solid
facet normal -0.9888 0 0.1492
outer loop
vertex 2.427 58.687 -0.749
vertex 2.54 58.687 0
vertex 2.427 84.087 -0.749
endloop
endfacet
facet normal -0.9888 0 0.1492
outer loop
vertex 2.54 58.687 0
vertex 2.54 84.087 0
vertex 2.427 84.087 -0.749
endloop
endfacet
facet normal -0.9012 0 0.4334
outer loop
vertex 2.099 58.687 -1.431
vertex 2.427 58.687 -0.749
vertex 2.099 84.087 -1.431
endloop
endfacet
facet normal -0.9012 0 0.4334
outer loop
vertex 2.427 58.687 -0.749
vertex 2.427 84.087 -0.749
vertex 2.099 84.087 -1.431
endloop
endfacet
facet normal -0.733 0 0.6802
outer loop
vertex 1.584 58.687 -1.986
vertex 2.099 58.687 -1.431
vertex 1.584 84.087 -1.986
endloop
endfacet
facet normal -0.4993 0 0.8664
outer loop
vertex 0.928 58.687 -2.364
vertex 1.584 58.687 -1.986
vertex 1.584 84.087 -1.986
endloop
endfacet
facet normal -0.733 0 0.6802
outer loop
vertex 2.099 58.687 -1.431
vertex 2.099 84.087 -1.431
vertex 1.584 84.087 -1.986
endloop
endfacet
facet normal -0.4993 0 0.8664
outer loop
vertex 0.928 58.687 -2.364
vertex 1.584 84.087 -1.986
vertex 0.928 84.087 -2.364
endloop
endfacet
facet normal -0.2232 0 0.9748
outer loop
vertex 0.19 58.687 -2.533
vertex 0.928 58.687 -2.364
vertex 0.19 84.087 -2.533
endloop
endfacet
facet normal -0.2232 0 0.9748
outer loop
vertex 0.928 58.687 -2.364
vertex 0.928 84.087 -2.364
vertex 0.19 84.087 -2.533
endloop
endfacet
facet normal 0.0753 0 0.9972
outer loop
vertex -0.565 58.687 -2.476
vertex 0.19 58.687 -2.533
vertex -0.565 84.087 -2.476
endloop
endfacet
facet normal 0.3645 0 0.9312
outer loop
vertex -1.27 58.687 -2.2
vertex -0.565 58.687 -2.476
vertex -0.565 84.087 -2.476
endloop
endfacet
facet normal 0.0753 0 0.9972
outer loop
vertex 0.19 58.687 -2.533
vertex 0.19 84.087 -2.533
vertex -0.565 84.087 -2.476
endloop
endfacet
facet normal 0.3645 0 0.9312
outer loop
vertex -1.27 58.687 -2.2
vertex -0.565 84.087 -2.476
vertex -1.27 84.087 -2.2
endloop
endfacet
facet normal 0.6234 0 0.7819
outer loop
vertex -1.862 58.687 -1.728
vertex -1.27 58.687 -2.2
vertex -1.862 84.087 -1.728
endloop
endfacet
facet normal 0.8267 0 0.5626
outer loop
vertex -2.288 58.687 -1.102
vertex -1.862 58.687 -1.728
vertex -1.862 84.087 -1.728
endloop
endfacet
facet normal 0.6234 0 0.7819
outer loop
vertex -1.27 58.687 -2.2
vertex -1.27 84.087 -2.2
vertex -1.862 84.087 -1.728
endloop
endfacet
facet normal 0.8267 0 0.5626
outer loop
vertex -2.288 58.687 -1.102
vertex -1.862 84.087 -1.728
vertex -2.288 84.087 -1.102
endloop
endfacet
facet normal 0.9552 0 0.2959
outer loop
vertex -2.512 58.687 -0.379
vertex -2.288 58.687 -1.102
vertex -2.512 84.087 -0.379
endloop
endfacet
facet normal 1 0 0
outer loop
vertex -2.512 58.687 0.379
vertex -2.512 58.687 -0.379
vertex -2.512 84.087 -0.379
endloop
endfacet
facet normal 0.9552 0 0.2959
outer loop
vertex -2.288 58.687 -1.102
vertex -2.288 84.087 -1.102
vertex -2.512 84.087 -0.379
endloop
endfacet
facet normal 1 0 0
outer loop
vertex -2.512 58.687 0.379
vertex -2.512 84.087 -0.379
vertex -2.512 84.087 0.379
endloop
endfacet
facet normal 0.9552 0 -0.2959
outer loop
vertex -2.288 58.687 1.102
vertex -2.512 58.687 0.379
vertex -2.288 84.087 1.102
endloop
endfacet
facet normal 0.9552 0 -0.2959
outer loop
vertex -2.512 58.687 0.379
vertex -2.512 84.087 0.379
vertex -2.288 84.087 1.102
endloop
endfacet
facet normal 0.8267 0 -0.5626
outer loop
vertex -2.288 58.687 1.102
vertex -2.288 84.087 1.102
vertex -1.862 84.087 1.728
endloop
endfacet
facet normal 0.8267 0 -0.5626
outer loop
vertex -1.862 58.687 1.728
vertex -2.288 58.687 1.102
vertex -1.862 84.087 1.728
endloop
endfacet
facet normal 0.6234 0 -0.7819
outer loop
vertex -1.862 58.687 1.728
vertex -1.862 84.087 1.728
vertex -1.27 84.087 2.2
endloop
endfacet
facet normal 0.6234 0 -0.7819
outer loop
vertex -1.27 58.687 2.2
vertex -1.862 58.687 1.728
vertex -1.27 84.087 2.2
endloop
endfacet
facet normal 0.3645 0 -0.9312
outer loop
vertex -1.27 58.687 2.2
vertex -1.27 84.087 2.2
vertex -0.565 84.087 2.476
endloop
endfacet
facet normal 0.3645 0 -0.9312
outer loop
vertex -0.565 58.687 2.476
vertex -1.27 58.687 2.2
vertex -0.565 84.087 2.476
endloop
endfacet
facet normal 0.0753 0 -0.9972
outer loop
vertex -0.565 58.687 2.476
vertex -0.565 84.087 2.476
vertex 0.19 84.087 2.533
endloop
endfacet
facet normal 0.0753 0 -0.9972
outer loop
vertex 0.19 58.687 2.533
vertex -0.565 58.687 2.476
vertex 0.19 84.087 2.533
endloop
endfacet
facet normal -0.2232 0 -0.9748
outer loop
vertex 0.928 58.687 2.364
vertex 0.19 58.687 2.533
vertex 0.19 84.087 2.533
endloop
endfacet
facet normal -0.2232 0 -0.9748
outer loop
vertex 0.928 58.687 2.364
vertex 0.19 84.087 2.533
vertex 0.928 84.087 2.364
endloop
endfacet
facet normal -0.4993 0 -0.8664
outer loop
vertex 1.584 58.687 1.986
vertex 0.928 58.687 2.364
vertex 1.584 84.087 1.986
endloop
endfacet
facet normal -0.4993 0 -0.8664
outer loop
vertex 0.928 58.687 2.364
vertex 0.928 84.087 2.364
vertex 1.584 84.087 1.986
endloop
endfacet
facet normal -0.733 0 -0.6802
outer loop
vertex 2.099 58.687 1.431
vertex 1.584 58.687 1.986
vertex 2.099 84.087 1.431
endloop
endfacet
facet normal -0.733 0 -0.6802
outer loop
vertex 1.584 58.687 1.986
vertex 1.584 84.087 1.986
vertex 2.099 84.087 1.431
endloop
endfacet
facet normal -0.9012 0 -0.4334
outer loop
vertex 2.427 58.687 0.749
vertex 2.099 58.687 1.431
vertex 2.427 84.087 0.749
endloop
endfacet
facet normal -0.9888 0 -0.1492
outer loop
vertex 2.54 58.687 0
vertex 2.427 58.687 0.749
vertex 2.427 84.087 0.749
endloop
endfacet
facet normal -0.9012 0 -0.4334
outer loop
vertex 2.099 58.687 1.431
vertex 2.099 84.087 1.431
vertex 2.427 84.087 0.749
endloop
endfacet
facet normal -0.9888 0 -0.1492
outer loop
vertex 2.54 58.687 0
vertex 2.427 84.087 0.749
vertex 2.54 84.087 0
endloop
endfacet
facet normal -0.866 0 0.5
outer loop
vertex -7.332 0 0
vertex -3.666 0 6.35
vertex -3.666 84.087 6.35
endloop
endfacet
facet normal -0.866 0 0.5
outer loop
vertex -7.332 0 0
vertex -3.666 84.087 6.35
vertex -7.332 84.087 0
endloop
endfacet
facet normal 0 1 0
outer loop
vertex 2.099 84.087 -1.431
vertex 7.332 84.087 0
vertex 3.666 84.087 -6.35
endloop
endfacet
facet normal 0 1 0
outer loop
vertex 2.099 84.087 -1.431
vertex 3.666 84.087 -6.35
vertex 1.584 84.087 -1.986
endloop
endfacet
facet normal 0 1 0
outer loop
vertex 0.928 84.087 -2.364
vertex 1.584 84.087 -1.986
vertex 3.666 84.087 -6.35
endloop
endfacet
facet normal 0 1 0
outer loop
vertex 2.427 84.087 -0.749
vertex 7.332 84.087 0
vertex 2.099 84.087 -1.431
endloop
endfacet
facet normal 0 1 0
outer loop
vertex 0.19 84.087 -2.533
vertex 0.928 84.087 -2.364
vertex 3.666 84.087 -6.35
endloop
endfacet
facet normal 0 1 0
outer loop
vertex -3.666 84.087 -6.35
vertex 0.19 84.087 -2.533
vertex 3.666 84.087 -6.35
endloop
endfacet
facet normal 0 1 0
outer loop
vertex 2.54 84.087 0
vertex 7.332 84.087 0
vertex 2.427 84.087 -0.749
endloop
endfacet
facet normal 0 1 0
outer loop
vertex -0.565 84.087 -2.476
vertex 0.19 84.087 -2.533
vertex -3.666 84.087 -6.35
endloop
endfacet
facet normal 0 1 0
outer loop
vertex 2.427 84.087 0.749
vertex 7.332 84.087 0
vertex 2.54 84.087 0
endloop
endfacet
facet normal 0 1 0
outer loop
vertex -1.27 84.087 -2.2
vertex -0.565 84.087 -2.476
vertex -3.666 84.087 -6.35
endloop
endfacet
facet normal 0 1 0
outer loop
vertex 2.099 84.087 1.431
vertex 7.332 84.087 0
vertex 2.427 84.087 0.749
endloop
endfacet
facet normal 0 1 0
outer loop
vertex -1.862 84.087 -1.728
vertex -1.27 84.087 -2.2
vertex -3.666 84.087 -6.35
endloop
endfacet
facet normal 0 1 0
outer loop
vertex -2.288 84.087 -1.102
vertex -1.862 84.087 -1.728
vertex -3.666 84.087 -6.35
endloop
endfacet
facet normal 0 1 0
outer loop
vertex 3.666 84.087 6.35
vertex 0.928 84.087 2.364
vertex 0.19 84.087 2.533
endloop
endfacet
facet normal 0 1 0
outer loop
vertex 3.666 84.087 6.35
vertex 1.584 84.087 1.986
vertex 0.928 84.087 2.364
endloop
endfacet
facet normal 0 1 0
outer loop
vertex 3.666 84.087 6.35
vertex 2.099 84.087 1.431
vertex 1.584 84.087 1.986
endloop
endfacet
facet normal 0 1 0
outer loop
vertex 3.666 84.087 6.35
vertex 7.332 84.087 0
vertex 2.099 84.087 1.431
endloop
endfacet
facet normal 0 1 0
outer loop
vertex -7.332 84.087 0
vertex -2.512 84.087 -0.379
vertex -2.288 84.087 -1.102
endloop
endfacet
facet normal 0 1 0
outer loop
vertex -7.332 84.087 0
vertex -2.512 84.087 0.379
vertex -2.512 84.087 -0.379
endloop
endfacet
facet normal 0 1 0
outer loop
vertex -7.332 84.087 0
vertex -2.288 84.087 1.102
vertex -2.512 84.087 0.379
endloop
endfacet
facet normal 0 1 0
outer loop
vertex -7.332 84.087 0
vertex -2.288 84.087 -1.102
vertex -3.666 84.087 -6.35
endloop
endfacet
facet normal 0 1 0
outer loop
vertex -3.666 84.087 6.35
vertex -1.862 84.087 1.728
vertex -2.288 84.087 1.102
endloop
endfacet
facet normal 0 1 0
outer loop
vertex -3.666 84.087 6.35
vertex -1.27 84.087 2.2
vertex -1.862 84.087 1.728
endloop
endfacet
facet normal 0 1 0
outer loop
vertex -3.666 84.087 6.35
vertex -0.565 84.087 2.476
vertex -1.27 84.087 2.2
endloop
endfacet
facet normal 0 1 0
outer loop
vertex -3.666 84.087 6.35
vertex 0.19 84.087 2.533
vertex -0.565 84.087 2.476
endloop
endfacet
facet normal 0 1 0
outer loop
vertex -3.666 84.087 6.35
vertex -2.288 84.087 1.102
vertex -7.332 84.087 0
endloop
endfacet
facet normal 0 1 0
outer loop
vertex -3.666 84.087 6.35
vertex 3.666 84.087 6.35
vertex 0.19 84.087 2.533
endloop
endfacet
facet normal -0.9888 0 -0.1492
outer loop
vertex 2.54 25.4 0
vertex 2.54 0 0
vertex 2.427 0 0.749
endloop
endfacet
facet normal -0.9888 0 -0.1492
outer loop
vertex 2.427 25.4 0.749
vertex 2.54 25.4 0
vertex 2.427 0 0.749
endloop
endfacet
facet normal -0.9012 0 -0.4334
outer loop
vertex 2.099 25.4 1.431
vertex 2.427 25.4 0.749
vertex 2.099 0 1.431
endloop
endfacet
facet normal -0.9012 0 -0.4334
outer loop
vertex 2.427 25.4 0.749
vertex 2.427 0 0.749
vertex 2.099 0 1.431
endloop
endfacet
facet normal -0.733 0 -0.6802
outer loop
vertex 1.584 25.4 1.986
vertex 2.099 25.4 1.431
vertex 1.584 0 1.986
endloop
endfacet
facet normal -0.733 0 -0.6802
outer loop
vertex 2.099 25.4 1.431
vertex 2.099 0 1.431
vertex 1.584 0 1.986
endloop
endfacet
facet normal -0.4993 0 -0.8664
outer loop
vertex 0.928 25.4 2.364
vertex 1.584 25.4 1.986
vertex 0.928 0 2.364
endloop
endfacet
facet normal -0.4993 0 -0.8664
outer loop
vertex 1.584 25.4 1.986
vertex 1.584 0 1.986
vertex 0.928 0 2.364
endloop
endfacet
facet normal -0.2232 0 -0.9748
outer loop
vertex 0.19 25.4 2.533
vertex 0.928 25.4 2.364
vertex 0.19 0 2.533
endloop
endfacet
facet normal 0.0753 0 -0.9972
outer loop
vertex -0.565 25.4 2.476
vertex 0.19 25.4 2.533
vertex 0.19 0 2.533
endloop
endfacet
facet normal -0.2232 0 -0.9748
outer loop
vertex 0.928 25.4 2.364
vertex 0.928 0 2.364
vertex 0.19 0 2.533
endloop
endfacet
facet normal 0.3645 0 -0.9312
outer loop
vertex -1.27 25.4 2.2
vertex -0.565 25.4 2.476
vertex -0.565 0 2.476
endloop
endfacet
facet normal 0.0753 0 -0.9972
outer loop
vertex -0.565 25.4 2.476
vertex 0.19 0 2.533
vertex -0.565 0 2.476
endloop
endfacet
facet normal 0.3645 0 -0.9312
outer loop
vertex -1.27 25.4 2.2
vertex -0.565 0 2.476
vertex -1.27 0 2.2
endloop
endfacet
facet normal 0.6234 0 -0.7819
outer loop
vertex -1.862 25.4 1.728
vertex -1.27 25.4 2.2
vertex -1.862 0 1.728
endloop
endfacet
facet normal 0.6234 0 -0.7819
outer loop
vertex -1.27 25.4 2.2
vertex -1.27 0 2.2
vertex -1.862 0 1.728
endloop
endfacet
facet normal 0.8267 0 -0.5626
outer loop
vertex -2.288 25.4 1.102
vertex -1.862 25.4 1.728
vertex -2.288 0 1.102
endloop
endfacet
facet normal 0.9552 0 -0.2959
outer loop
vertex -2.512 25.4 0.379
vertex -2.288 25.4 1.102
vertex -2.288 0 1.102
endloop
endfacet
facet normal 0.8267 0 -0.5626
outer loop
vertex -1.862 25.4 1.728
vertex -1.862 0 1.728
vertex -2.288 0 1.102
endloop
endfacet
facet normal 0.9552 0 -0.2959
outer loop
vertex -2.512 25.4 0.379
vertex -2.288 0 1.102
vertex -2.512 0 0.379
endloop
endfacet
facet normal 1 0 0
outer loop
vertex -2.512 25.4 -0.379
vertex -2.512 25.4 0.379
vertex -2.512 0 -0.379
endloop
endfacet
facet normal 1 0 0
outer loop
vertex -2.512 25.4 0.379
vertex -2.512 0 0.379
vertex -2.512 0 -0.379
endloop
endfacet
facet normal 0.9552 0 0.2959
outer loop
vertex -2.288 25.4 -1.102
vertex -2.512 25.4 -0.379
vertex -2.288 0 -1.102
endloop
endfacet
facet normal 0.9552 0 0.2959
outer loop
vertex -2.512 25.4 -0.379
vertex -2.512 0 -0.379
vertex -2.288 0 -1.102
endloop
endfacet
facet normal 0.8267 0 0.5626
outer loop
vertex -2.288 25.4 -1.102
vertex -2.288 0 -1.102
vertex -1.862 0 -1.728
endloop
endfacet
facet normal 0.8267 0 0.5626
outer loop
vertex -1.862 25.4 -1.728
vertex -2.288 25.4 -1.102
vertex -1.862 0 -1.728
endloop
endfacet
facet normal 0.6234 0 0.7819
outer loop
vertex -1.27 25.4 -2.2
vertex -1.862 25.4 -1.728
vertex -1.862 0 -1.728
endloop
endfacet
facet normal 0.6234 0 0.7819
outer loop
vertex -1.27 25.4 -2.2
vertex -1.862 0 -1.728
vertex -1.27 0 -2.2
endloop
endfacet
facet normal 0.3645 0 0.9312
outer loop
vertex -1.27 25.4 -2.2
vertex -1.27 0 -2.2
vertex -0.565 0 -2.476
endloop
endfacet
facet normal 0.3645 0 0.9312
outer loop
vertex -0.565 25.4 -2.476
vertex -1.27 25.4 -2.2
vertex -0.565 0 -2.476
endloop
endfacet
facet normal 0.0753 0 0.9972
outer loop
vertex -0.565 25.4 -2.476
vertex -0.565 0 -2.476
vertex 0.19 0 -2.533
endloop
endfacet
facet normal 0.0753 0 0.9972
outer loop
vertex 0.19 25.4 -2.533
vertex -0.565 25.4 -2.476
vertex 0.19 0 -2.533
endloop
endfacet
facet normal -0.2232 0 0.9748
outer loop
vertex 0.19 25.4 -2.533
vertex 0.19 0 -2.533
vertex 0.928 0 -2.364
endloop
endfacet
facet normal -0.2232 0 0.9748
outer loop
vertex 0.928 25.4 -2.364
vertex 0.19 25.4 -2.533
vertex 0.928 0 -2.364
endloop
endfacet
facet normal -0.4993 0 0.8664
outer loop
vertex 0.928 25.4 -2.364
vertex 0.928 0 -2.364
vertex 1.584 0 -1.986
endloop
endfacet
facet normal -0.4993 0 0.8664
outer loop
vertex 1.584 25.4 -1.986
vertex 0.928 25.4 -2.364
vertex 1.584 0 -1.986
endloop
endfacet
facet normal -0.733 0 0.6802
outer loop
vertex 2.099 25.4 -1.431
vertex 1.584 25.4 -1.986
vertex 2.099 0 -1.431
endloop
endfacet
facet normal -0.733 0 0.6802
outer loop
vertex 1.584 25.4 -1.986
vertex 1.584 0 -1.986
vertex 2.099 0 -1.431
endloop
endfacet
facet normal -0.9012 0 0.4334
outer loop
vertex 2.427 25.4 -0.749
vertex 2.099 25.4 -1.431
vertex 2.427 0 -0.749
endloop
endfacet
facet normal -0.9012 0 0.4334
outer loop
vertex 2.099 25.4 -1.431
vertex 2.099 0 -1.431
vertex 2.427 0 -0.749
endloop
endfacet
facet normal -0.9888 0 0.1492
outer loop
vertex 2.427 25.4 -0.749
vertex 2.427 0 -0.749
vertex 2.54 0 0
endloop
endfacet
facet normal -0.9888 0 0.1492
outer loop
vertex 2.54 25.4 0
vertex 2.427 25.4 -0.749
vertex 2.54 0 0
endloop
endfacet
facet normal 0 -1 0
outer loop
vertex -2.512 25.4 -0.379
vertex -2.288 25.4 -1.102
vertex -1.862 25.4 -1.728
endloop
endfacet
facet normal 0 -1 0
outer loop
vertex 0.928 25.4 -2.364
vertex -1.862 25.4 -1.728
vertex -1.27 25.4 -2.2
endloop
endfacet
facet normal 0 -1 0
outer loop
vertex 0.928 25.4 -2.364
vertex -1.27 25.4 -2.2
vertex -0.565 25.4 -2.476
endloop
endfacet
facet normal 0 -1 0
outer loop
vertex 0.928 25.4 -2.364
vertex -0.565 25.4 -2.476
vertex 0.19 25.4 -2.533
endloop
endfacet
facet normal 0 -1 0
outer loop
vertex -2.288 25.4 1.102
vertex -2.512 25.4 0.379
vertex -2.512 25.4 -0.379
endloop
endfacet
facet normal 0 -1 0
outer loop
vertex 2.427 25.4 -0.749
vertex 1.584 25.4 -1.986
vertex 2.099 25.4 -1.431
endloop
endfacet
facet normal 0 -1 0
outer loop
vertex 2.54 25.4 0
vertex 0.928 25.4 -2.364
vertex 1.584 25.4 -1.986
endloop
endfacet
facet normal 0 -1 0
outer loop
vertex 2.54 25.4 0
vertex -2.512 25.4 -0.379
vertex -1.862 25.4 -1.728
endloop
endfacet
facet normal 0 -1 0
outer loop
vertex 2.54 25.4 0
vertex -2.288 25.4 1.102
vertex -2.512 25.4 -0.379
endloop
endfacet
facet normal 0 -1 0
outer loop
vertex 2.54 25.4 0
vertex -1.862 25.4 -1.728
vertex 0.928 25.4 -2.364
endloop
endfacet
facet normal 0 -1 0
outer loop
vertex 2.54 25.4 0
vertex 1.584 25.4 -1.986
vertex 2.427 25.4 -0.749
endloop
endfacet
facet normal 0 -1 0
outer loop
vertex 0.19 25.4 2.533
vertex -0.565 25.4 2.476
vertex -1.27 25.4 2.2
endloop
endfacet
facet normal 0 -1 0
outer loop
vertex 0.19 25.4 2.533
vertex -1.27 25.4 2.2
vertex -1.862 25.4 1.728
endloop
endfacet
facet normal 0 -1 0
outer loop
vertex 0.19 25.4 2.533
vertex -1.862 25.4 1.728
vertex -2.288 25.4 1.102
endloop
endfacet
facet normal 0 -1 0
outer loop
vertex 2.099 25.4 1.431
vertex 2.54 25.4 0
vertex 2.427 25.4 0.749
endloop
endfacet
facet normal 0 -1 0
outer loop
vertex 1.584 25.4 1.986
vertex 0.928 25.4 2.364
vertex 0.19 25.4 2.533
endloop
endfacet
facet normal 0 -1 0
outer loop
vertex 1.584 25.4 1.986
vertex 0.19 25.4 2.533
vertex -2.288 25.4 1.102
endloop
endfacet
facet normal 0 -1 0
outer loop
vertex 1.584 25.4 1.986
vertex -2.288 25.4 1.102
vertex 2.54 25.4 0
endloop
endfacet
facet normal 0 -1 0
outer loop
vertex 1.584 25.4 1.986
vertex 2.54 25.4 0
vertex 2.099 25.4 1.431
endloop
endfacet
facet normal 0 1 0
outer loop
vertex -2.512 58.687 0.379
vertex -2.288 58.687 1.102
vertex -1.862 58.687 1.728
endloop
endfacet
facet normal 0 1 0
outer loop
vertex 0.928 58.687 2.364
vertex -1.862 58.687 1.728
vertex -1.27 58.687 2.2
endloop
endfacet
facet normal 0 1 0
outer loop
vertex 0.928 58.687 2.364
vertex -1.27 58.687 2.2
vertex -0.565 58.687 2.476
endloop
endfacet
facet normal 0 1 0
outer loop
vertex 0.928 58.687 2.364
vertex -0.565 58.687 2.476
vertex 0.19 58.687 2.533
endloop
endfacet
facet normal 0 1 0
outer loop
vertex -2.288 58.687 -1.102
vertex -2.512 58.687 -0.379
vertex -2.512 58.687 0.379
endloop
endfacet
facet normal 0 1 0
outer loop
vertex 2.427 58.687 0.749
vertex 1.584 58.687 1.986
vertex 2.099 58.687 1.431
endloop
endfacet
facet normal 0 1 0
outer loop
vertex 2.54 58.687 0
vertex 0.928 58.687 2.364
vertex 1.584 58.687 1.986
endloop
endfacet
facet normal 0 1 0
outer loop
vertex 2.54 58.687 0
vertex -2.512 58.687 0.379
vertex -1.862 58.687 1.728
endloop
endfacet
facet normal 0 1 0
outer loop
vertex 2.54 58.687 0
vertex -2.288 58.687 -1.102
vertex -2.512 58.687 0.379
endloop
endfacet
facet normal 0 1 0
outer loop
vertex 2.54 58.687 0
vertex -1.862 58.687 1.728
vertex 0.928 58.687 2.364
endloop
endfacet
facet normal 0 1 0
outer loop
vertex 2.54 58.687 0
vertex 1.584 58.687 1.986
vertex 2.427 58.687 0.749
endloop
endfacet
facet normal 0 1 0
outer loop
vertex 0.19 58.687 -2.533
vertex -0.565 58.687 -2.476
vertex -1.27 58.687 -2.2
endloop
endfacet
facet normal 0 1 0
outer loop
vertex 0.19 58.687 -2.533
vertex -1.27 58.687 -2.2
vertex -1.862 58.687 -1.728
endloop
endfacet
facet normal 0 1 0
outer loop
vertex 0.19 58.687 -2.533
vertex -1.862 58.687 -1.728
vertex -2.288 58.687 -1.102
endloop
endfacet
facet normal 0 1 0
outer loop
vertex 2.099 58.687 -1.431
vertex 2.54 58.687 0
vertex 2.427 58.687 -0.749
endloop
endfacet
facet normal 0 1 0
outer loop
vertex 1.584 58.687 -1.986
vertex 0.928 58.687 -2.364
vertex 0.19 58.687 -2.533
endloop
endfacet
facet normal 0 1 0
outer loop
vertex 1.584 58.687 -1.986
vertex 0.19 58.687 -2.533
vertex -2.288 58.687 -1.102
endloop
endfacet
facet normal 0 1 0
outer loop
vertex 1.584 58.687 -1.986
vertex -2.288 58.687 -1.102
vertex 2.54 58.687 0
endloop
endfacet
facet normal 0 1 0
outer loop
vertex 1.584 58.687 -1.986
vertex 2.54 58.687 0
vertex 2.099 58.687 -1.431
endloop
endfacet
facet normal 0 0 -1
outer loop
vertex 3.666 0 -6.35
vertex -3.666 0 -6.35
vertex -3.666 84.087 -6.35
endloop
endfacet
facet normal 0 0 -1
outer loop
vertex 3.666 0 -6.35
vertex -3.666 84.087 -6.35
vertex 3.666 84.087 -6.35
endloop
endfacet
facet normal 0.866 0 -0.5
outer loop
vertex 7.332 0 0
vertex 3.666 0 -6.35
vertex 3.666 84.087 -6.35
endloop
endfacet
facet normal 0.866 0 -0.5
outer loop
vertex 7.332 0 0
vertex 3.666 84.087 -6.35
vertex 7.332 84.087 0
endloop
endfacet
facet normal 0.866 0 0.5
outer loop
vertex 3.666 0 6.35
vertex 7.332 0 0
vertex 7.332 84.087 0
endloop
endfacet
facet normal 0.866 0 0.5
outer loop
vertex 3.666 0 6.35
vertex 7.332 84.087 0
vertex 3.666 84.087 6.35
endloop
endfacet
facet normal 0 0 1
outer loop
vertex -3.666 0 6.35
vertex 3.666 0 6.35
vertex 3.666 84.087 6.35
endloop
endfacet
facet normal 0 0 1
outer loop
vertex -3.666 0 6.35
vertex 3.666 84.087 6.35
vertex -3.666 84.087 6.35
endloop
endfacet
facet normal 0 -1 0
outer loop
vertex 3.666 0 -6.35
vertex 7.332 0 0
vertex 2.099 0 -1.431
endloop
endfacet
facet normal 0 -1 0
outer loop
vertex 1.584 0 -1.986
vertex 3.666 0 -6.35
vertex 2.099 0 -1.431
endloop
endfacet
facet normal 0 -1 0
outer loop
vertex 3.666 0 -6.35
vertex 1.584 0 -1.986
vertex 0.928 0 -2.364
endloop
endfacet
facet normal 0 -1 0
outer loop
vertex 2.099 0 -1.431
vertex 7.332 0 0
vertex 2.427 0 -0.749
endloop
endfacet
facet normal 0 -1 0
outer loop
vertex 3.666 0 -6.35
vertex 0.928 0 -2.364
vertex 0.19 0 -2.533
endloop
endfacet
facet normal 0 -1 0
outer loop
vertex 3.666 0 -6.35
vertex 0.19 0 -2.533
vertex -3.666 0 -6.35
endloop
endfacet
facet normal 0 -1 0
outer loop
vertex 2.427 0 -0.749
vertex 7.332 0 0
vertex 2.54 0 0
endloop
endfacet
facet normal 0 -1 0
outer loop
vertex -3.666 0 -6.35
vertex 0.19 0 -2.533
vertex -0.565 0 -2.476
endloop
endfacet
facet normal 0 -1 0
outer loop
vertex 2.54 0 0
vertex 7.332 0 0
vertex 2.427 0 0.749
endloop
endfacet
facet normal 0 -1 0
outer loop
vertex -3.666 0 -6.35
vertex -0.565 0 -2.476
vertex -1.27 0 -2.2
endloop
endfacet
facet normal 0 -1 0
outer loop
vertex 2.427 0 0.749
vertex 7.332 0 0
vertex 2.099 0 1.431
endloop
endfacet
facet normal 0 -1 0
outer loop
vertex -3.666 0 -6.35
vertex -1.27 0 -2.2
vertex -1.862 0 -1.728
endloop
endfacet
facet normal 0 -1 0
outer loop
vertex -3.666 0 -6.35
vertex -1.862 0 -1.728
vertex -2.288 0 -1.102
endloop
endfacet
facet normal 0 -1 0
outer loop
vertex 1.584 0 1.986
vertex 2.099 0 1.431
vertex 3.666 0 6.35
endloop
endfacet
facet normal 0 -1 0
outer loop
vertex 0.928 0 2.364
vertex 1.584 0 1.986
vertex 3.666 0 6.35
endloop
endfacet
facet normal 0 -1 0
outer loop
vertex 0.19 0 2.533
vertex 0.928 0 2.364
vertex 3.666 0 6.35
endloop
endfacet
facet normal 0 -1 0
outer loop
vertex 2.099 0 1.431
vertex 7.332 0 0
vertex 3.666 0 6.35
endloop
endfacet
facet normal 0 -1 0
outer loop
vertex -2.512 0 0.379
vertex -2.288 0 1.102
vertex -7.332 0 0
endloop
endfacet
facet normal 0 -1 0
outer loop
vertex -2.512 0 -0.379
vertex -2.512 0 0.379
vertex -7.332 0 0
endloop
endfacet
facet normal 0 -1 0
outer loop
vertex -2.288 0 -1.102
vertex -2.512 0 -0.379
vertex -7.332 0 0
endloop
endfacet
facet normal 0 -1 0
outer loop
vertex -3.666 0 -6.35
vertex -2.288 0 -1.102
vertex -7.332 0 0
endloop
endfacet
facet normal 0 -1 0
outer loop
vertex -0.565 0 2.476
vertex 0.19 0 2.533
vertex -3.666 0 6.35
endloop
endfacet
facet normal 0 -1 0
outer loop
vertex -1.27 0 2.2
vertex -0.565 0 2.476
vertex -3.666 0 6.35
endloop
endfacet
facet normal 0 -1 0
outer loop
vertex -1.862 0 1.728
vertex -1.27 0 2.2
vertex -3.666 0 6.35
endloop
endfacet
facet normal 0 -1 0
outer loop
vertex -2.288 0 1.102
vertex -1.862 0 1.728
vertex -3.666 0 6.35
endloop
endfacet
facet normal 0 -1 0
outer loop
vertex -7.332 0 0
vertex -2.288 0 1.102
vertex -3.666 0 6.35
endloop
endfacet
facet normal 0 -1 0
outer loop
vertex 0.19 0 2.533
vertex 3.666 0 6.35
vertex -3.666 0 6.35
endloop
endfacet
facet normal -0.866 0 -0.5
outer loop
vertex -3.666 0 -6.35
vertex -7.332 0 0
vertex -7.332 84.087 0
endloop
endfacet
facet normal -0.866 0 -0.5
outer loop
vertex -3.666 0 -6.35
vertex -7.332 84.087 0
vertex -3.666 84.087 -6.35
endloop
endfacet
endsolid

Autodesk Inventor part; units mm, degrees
ref_plane "YZ Plane" through (0, 0, 0) normal (1, 0, 0) x (0, 1, 0)
ref_plane "XZ Plane" through (0, 0, 0) normal (0, 1, 0) x (-1, 0, 0)
ref_plane "XY Plane" through (0, 0, 0) normal (0, 0, 1) x (1, 0, 0)
sketch "Sketch1" plane through (0, 0, 0) normal (0, 1, 0) x (-1, 0, 0)
  line L0 (-3.6662, 6.35) -> (3.6662, 6.35)
  line L1 (3.6662, 6.35) -> (7.3323, 0)
  line L2 (7.3323, 0) -> (3.6662, -6.35)
  line L3 (3.6662, -6.35) -> (-3.6662, -6.35)
  line L4 (-3.6662, -6.35) -> (-7.3323, 0)
  line L5 (-7.3323, 0) -> (-3.6662, 6.35)
  point P0 (0, 0)
  point P1 (0, 0)
  dimension "d0" = 12.7
extrude "Extrusion1" add sketch "Sketch1" along normal blind 84.0867
sketch "Sketch2" plane through (0, 84.0867, 0) normal (0, 1, 0) x (1, 0, 0)
  circle A0 centre (0, 0) radius 2.54
  dimension "d3" = 5.08
extrude "Extrusion2" cut sketch "Sketch2" against normal blind 25.4
thread "Thread1" size "1/4-20 UNC" class "2B" standard "ANSI Unified Screw Threads" full length
sketch "Sketch3" plane through (0, 0, 0) normal (0, -1, 0) x (1, 0, 0)
  circle A0 centre (0, 0) radius 2.54
  dimension "d8" = 5.08
extrude "Extrusion3" cut sketch "Sketch3" against normal blind 25.4
thread "Thread2" size "1/4-20 UNC" class "2B" standard "ANSI Unified Screw Threads" full length
properties part number "OUTK_015_Shaft2" material "Aluminum 6061"
